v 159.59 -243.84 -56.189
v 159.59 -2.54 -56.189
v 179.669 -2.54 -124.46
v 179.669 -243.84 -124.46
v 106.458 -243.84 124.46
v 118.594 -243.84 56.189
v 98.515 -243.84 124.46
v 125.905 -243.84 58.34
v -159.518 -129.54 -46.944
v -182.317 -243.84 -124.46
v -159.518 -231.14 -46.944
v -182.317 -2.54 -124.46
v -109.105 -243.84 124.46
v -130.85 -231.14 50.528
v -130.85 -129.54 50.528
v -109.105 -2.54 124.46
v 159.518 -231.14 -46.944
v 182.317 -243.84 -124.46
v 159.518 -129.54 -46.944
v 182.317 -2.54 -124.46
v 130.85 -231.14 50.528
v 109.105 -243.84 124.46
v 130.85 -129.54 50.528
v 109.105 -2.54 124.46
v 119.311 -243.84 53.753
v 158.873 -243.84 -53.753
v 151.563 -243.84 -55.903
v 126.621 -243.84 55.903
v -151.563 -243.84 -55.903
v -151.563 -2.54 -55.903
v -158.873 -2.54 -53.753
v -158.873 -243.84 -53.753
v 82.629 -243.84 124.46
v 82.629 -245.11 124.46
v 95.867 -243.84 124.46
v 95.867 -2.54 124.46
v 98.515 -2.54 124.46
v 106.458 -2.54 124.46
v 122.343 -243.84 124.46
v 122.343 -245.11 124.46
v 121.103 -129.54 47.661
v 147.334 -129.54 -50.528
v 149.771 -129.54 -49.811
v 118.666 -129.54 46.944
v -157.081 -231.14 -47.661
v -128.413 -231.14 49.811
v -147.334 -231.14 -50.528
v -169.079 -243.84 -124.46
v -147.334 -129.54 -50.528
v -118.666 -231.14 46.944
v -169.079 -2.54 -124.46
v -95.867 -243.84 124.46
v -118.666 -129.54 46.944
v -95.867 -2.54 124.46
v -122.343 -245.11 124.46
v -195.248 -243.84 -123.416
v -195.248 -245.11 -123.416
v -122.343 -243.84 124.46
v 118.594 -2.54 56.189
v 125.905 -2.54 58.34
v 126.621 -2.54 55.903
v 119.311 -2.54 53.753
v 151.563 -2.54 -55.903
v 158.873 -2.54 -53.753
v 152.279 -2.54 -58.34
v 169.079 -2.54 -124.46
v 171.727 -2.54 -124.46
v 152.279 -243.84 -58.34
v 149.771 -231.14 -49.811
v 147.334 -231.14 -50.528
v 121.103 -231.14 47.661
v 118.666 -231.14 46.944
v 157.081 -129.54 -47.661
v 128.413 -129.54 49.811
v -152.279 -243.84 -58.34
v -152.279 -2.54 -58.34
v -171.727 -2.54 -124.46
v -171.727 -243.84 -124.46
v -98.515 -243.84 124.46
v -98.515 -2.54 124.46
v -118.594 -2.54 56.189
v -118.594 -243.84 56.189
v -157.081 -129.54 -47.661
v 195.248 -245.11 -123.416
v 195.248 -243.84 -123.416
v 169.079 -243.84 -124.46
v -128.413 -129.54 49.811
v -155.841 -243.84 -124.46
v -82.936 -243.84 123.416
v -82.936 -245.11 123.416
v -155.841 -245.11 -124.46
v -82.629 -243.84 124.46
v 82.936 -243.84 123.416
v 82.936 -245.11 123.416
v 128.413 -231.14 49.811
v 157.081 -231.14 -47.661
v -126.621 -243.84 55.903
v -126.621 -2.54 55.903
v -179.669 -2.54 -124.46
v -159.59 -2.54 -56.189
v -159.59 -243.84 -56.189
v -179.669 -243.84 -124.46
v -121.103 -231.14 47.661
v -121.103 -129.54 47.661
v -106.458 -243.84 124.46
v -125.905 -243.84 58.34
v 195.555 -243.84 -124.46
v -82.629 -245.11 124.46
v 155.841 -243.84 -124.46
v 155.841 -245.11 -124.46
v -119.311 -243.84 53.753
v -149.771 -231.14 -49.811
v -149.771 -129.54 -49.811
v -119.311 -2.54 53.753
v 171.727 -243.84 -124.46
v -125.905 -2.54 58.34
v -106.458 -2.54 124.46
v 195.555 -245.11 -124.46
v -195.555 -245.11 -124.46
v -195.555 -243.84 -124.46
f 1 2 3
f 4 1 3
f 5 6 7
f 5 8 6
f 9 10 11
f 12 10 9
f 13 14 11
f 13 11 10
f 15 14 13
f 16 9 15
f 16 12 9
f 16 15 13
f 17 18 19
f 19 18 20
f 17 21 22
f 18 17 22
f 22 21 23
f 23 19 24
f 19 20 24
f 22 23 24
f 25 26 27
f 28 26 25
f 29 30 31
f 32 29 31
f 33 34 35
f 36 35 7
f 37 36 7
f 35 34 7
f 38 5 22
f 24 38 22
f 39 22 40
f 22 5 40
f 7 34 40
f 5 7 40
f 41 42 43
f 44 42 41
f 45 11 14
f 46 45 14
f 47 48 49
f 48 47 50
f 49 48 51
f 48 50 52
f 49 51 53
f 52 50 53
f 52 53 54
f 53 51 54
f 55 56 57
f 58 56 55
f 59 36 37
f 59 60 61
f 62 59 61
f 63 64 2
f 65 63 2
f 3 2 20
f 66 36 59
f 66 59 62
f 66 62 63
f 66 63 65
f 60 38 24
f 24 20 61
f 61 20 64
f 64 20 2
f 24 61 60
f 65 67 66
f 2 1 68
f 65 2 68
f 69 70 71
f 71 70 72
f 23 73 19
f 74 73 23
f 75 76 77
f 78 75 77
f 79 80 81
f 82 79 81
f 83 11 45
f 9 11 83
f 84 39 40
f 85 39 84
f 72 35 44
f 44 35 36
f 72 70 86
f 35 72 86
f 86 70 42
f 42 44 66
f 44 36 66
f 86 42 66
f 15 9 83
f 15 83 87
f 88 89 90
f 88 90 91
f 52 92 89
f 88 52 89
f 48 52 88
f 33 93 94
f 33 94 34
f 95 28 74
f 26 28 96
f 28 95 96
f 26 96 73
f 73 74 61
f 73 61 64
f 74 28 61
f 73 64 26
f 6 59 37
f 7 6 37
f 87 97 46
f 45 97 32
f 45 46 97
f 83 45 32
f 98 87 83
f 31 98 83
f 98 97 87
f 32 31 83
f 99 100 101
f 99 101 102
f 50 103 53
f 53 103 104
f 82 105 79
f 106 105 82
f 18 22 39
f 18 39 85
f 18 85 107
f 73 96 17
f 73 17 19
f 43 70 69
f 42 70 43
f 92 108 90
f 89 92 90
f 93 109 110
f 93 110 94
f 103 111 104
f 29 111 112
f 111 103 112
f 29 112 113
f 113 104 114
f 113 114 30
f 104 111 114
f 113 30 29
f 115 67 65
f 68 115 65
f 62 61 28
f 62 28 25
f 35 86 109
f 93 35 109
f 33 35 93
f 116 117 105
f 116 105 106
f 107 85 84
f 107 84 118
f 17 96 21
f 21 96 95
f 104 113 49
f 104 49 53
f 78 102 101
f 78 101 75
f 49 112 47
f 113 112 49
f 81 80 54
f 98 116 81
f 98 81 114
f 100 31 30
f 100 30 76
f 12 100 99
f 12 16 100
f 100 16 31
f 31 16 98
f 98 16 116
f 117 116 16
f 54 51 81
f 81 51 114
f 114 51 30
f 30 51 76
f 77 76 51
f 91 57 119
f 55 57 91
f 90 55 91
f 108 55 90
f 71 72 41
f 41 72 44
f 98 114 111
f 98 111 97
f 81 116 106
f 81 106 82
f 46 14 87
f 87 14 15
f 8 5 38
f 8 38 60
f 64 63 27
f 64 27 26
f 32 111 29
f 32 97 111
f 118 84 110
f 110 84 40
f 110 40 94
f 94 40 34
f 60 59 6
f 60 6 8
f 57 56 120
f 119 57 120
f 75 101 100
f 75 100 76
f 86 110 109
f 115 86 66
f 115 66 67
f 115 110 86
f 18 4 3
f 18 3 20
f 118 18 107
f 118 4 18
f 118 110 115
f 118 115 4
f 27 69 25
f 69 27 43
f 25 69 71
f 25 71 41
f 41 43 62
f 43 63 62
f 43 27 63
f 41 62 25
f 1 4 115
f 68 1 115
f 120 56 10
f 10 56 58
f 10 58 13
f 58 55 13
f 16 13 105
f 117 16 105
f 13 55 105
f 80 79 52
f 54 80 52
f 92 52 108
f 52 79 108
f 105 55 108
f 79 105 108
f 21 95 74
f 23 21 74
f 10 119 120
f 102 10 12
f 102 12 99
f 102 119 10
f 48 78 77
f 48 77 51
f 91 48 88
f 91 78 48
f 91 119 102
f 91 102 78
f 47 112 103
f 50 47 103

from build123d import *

# Parameters (mm, degrees)
BOSS_EXTRUDE2_DEPTH      = 245.11
BOSS_EXTRUDE2_2_DEPTH    = 245.11
BOSS_EXTRUDE2_3_DEPTH    = 245.11
BOSS_EXTRUDE2_4_DEPTH    = 245.11
BOSS_EXTRUDE3_DEPTH      = 245.11
SKETCH4_W                = 264.758321603
SKETCH4_H                = 1.27
BOSS_EXTRUDE4_DEPTH      = 12.7
BOSS_EXTRUDE5_DEPTH      = 12.7
BOSS_EXTRUDE5_DEPTH_BACK = 12.7
SKETCH6_W                = 264.758321603
SKETCH6_H                = 1.27
BOSS_EXTRUDE6_DEPTH      = 12.7
BOSS_EXTRUDE6_DEPTH_BACK = 12.7
SKETCH7_W                = 264.758321603
SKETCH7_H                = 1.27
SKETCH8_W                = 264.758321603
SKETCH8_H                = 1.27
BOSS_EXTRUDE7_DEPTH      = 12.7
SKETCH13_W               = 101.6
SKETCH13_H               = 101.6
CUT_EXTRUDE1_DEPTH       = 12.7
SKETCH14_W               = 26.475832161
SKETCH14_H               = 3.583512315
CUT_EXTRUDE2_DEPTH       = 340.488918503
SKETCH15_W               = 26.475832161
SKETCH15_H               = 3.583512315
CUT_EXTRUDE3_DEPTH       = 340.488918503
BOSS_EXTRUDE8_DEPTH      = 1.27
BOSS_EXTRUDE9_DEPTH      = 1.27
SKETCH18_W               = 101.6
SKETCH18_H               = 101.6
CUT_EXTRUDE4_DEPTH       = 434.441384542
CUT_EXTRUDE5_DEPTH       = 339.736410143
CUT_EXTRUDE5_DEPTH_BACK  = 339.736410143
SKETCH19_W               = 254
SKETCH19_H               = 2.54
CUT_EXTRUDE6_DEPTH       = 339.736410143
CUT_EXTRUDE6_DEPTH_BACK  = 339.736410143
SKETCH20_W               = 392.603838272
SKETCH20_H               = 2.54


with BuildPart() as part:
    # Sketch2 → Boss-Extrude2 (new body)
    with BuildSketch(Plane(origin=(0, 0, 0), x_dir=(1, 0, 0), z_dir=(0, 1, 0))):
        Polygon((-159.589794279, 56.189473094), (-152.279429157, 58.339580483), (-151.562726694, 55.902792109), (-158.873091816, 53.75268472), align=None)
    extrude(amount=-BOSS_EXTRUDE2_DEPTH)



with BuildPart() as body_2:
    # Sketch2 → Boss-Extrude2 2 (new body)
    with BuildSketch(Plane(origin=(0, 0, 0), x_dir=(1, 0, 0), z_dir=(0, 1, 0))):
        Polygon((-125.904778521, -58.339580483), (-118.594413399, -56.189473094), (-119.311115862, -53.75268472), (-126.621480984, -55.902792109), align=None)
    extrude(amount=-BOSS_EXTRUDE2_2_DEPTH)


with BuildPart() as body_3:
    # Sketch2 → Boss-Extrude2 3 (new body)
    with BuildSketch(Plane(origin=(0, 0, 0), x_dir=(1, 0, 0), z_dir=(0, 1, 0))):
        Polygon((119.311115862, -53.75268472), (118.594413399, -56.189473094), (125.904778521, -58.339580483), (126.621480984, -55.902792109), align=None)
    extrude(amount=-BOSS_EXTRUDE2_3_DEPTH)


with BuildPart() as body_4:
    # Sketch2 → Boss-Extrude2 4 (new body)
    with BuildSketch(Plane(origin=(0, 0, 0), x_dir=(1, 0, 0), z_dir=(0, 1, 0))):
        Polygon((158.873091816, 53.75268472), (159.589794279, 56.189473094), (152.279429157, 58.339580483), (151.562726694, 55.902792109), align=None)
    extrude(amount=-BOSS_EXTRUDE2_4_DEPTH)


with BuildPart() as part_1:
    add(part.part)

    add(body_2.part)  # Boss-Extrude3 merges body 2

    add(body_3.part)  # Boss-Extrude3 merges body 3

    add(body_4.part)  # Boss-Extrude3 merges body 4
    # Sketch3 → Boss-Extrude3 (add)
    with BuildSketch(Plane(origin=(0, 0, 0), x_dir=(1, 0, 0), z_dir=(0, 1, 0))):
        Polygon((-152.279429157, 58.339580483), (-172.473670191, 127), (-169.826086975, 127), (-95.120204622, -127), (-97.767787838, -127), (-118.594413399, -56.189473094), align=None)
        Polygon((-180.416419839, 127), (-183.064003056, 127), (-108.358120703, -127), (-105.710537487, -127), (-125.904778521, -58.339580483), (-159.589794279, 56.189473094), align=None)
        Polygon((159.589794279, 56.189473094), (180.416419839, 127), (183.064003056, 127), (108.358120703, -127), (105.710537487, -127), (125.904778521, -58.339580483), align=None)
        Polygon((152.279429157, 58.339580483), (118.594413399, -56.189473094), (97.767787838, -127), (95.120204622, -127), (169.826086975, 127), (172.473670191, 127), align=None)
    extrude(amount=-BOSS_EXTRUDE3_DEPTH)

    # Sketch4 → Boss-Extrude4 (add)
    with BuildSketch(Plane(origin=(-134.109862685, 0, 39.44407726), x_dir=(0.28216632399155117, 0, 0.9593655015712703), z_dir=(-0.9593655015712702, 0, 0.2821663239915511))):
        with Locations((-41.114754696, -244.475)):
            Rectangle(SKETCH4_W, SKETCH4_H)
    extrude(amount=BOSS_EXTRUDE4_DEPTH)

    # Sketch6 → Boss-Extrude5 (add, two sides: drawn at the far end of the back side and taken through both)
    with BuildSketch(Plane(origin=(-121.925920815, 0, 35.860564946), x_dir=(-0.28216632399155095, 0, -0.9593655015712704), z_dir=(0.9593655015712704, 0, -0.28216632399155095)).offset(-BOSS_EXTRUDE5_DEPTH_BACK)):
        with Locations((37.379460577, -244.475)):
            Rectangle(SKETCH6_W, SKETCH6_H)
    extrude(amount=BOSS_EXTRUDE5_DEPTH + BOSS_EXTRUDE5_DEPTH_BACK)

    # Sketch7 → Boss-Extrude6 (add, two sides: drawn at the far end of the back side and taken through both)
    with BuildSketch(Plane(origin=(121.925920815, 0, 35.860564946), x_dir=(-0.28216632399155095, 0, 0.9593655015712704), z_dir=(-0.9593655015712704, 0, -0.28216632399155095)).offset(-BOSS_EXTRUDE6_DEPTH_BACK)):
        with Locations((-37.379460577, -244.475)):
            Rectangle(SKETCH7_W, SKETCH7_H)
    extrude(amount=BOSS_EXTRUDE6_DEPTH + BOSS_EXTRUDE6_DEPTH_BACK)

    # Sketch8 → Boss-Extrude7 (add)
    with BuildSketch(Plane(origin=(134.109862685, 0, 39.44407726), x_dir=(0.28216632399155117, 0, -0.9593655015712703), z_dir=(0.9593655015712702, 0, 0.2821663239915511))):
        with Locations((41.114754696, -244.475)):
            Rectangle(SKETCH8_W, SKETCH8_H)
    extrude(amount=BOSS_EXTRUDE7_DEPTH)

    # Sketch13 → Cut-Extrude1 (cut)
    with BuildSketch(Plane(origin=(-134.109862685, 0, 39.44407726), x_dir=(0.28216632399155117, 0, 0.9593655015712703), z_dir=(-0.9593655015712702, 0, 0.2821663239915511))):
        with Locations((-39.247107636, -180.34)):
            Rectangle(SKETCH13_W, SKETCH13_H)
    extrude(amount=-CUT_EXTRUDE1_DEPTH, mode=Mode.SUBTRACT)

    # Sketch14 → Cut-Extrude2 (cut, through all)
    with BuildSketch(Plane(origin=(0, 0, 0), x_dir=(1, 0, 0), z_dir=(0, 1, 0))):
        with Locations((-169.826086976, 128.791756158)):
            Rectangle(SKETCH14_W, SKETCH14_H)
        with Locations((169.826086976, 128.791756158)):
            Rectangle(SKETCH14_W, SKETCH14_H)
    extrude(amount=-CUT_EXTRUDE2_DEPTH, mode=Mode.SUBTRACT)

    # Sketch15 → Cut-Extrude3 (cut, through all)
    with BuildSketch(Plane(origin=(0, 0, 0), x_dir=(1, 0, 0), z_dir=(0, 1, 0))):
        with Locations((-108.358120703, -128.791756158)):
            Rectangle(SKETCH15_W, SKETCH15_H)
        with Locations((108.358120703, -128.791756158)):
            Rectangle(SKETCH15_W, SKETCH15_H)
    extrude(amount=-CUT_EXTRUDE3_DEPTH, mode=Mode.SUBTRACT)

    # Sketch16 → Boss-Extrude8 (add)
    with BuildSketch(Plane.XZ.offset(245.11)):
        Polygon((-82.936262752, 123.416487685), (-95.120204622, 123.416487685), (-95.120204622, 127), (-81.882288542, 127), align=None)
        Polygon((82.936262752, 123.416487685), (81.882288542, 127), (95.120204622, 127), (95.120204622, 123.416487685), align=None)
    extrude(amount=-BOSS_EXTRUDE8_DEPTH)

    # Sketch17 → Boss-Extrude9 (add)
    with BuildSketch(Plane.XZ.offset(245.11)):
        Polygon((-195.247944925, -123.416487685), (-196.301919136, -127), (-156.588170895, -127), (-156.588170895, -123.416487685), align=None)
        Polygon((156.588170895, -123.416487685), (195.247944925, -123.416487685), (196.301919136, -127), (156.588170895, -127), align=None)
    extrude(amount=-BOSS_EXTRUDE9_DEPTH)

    # Sketch18 → Cut-Extrude4 (cut, through all)
    with BuildSketch(Plane(origin=(121.925920815, 0, 35.860564946), x_dir=(-0.28216632399155095, 0, 0.9593655015712704), z_dir=(-0.9593655015712704, 0, -0.28216632399155095))):
        with Locations((-39.247107636, -180.34)):
            Rectangle(SKETCH18_W, SKETCH18_H)
    extrude(amount=-CUT_EXTRUDE4_DEPTH, mode=Mode.SUBTRACT)

    # Sketch19 → Cut-Extrude5 (cut, two sides: drawn at the far end of the back side and taken through both)
    with BuildSketch(Plane(origin=(0, 0, 0), x_dir=(0, 0, -1), z_dir=(1, 0, 0)).offset(-CUT_EXTRUDE5_DEPTH_BACK)):
        with Locations((0, -1.27)):
            Rectangle(SKETCH19_W, SKETCH19_H)
    extrude(amount=CUT_EXTRUDE5_DEPTH + CUT_EXTRUDE5_DEPTH_BACK, mode=Mode.SUBTRACT)

    # Sketch20 → Cut-Extrude6 (cut, two sides: drawn at the far end of the back side and taken through both)
    with BuildSketch(Plane(origin=(0, 0, 0), x_dir=(1, 0, 0), z_dir=(0, 1, 0)).offset(-CUT_EXTRUDE6_DEPTH_BACK)):
        with Locations((0, 125.73)):
            Rectangle(SKETCH20_W, SKETCH20_H)
        with Locations((0, -125.73)):
            Rectangle(SKETCH20_W, SKETCH20_H)
    extrude(amount=CUT_EXTRUDE6_DEPTH + CUT_EXTRUDE6_DEPTH_BACK, mode=Mode.SUBTRACT)


solid = part_1.part
